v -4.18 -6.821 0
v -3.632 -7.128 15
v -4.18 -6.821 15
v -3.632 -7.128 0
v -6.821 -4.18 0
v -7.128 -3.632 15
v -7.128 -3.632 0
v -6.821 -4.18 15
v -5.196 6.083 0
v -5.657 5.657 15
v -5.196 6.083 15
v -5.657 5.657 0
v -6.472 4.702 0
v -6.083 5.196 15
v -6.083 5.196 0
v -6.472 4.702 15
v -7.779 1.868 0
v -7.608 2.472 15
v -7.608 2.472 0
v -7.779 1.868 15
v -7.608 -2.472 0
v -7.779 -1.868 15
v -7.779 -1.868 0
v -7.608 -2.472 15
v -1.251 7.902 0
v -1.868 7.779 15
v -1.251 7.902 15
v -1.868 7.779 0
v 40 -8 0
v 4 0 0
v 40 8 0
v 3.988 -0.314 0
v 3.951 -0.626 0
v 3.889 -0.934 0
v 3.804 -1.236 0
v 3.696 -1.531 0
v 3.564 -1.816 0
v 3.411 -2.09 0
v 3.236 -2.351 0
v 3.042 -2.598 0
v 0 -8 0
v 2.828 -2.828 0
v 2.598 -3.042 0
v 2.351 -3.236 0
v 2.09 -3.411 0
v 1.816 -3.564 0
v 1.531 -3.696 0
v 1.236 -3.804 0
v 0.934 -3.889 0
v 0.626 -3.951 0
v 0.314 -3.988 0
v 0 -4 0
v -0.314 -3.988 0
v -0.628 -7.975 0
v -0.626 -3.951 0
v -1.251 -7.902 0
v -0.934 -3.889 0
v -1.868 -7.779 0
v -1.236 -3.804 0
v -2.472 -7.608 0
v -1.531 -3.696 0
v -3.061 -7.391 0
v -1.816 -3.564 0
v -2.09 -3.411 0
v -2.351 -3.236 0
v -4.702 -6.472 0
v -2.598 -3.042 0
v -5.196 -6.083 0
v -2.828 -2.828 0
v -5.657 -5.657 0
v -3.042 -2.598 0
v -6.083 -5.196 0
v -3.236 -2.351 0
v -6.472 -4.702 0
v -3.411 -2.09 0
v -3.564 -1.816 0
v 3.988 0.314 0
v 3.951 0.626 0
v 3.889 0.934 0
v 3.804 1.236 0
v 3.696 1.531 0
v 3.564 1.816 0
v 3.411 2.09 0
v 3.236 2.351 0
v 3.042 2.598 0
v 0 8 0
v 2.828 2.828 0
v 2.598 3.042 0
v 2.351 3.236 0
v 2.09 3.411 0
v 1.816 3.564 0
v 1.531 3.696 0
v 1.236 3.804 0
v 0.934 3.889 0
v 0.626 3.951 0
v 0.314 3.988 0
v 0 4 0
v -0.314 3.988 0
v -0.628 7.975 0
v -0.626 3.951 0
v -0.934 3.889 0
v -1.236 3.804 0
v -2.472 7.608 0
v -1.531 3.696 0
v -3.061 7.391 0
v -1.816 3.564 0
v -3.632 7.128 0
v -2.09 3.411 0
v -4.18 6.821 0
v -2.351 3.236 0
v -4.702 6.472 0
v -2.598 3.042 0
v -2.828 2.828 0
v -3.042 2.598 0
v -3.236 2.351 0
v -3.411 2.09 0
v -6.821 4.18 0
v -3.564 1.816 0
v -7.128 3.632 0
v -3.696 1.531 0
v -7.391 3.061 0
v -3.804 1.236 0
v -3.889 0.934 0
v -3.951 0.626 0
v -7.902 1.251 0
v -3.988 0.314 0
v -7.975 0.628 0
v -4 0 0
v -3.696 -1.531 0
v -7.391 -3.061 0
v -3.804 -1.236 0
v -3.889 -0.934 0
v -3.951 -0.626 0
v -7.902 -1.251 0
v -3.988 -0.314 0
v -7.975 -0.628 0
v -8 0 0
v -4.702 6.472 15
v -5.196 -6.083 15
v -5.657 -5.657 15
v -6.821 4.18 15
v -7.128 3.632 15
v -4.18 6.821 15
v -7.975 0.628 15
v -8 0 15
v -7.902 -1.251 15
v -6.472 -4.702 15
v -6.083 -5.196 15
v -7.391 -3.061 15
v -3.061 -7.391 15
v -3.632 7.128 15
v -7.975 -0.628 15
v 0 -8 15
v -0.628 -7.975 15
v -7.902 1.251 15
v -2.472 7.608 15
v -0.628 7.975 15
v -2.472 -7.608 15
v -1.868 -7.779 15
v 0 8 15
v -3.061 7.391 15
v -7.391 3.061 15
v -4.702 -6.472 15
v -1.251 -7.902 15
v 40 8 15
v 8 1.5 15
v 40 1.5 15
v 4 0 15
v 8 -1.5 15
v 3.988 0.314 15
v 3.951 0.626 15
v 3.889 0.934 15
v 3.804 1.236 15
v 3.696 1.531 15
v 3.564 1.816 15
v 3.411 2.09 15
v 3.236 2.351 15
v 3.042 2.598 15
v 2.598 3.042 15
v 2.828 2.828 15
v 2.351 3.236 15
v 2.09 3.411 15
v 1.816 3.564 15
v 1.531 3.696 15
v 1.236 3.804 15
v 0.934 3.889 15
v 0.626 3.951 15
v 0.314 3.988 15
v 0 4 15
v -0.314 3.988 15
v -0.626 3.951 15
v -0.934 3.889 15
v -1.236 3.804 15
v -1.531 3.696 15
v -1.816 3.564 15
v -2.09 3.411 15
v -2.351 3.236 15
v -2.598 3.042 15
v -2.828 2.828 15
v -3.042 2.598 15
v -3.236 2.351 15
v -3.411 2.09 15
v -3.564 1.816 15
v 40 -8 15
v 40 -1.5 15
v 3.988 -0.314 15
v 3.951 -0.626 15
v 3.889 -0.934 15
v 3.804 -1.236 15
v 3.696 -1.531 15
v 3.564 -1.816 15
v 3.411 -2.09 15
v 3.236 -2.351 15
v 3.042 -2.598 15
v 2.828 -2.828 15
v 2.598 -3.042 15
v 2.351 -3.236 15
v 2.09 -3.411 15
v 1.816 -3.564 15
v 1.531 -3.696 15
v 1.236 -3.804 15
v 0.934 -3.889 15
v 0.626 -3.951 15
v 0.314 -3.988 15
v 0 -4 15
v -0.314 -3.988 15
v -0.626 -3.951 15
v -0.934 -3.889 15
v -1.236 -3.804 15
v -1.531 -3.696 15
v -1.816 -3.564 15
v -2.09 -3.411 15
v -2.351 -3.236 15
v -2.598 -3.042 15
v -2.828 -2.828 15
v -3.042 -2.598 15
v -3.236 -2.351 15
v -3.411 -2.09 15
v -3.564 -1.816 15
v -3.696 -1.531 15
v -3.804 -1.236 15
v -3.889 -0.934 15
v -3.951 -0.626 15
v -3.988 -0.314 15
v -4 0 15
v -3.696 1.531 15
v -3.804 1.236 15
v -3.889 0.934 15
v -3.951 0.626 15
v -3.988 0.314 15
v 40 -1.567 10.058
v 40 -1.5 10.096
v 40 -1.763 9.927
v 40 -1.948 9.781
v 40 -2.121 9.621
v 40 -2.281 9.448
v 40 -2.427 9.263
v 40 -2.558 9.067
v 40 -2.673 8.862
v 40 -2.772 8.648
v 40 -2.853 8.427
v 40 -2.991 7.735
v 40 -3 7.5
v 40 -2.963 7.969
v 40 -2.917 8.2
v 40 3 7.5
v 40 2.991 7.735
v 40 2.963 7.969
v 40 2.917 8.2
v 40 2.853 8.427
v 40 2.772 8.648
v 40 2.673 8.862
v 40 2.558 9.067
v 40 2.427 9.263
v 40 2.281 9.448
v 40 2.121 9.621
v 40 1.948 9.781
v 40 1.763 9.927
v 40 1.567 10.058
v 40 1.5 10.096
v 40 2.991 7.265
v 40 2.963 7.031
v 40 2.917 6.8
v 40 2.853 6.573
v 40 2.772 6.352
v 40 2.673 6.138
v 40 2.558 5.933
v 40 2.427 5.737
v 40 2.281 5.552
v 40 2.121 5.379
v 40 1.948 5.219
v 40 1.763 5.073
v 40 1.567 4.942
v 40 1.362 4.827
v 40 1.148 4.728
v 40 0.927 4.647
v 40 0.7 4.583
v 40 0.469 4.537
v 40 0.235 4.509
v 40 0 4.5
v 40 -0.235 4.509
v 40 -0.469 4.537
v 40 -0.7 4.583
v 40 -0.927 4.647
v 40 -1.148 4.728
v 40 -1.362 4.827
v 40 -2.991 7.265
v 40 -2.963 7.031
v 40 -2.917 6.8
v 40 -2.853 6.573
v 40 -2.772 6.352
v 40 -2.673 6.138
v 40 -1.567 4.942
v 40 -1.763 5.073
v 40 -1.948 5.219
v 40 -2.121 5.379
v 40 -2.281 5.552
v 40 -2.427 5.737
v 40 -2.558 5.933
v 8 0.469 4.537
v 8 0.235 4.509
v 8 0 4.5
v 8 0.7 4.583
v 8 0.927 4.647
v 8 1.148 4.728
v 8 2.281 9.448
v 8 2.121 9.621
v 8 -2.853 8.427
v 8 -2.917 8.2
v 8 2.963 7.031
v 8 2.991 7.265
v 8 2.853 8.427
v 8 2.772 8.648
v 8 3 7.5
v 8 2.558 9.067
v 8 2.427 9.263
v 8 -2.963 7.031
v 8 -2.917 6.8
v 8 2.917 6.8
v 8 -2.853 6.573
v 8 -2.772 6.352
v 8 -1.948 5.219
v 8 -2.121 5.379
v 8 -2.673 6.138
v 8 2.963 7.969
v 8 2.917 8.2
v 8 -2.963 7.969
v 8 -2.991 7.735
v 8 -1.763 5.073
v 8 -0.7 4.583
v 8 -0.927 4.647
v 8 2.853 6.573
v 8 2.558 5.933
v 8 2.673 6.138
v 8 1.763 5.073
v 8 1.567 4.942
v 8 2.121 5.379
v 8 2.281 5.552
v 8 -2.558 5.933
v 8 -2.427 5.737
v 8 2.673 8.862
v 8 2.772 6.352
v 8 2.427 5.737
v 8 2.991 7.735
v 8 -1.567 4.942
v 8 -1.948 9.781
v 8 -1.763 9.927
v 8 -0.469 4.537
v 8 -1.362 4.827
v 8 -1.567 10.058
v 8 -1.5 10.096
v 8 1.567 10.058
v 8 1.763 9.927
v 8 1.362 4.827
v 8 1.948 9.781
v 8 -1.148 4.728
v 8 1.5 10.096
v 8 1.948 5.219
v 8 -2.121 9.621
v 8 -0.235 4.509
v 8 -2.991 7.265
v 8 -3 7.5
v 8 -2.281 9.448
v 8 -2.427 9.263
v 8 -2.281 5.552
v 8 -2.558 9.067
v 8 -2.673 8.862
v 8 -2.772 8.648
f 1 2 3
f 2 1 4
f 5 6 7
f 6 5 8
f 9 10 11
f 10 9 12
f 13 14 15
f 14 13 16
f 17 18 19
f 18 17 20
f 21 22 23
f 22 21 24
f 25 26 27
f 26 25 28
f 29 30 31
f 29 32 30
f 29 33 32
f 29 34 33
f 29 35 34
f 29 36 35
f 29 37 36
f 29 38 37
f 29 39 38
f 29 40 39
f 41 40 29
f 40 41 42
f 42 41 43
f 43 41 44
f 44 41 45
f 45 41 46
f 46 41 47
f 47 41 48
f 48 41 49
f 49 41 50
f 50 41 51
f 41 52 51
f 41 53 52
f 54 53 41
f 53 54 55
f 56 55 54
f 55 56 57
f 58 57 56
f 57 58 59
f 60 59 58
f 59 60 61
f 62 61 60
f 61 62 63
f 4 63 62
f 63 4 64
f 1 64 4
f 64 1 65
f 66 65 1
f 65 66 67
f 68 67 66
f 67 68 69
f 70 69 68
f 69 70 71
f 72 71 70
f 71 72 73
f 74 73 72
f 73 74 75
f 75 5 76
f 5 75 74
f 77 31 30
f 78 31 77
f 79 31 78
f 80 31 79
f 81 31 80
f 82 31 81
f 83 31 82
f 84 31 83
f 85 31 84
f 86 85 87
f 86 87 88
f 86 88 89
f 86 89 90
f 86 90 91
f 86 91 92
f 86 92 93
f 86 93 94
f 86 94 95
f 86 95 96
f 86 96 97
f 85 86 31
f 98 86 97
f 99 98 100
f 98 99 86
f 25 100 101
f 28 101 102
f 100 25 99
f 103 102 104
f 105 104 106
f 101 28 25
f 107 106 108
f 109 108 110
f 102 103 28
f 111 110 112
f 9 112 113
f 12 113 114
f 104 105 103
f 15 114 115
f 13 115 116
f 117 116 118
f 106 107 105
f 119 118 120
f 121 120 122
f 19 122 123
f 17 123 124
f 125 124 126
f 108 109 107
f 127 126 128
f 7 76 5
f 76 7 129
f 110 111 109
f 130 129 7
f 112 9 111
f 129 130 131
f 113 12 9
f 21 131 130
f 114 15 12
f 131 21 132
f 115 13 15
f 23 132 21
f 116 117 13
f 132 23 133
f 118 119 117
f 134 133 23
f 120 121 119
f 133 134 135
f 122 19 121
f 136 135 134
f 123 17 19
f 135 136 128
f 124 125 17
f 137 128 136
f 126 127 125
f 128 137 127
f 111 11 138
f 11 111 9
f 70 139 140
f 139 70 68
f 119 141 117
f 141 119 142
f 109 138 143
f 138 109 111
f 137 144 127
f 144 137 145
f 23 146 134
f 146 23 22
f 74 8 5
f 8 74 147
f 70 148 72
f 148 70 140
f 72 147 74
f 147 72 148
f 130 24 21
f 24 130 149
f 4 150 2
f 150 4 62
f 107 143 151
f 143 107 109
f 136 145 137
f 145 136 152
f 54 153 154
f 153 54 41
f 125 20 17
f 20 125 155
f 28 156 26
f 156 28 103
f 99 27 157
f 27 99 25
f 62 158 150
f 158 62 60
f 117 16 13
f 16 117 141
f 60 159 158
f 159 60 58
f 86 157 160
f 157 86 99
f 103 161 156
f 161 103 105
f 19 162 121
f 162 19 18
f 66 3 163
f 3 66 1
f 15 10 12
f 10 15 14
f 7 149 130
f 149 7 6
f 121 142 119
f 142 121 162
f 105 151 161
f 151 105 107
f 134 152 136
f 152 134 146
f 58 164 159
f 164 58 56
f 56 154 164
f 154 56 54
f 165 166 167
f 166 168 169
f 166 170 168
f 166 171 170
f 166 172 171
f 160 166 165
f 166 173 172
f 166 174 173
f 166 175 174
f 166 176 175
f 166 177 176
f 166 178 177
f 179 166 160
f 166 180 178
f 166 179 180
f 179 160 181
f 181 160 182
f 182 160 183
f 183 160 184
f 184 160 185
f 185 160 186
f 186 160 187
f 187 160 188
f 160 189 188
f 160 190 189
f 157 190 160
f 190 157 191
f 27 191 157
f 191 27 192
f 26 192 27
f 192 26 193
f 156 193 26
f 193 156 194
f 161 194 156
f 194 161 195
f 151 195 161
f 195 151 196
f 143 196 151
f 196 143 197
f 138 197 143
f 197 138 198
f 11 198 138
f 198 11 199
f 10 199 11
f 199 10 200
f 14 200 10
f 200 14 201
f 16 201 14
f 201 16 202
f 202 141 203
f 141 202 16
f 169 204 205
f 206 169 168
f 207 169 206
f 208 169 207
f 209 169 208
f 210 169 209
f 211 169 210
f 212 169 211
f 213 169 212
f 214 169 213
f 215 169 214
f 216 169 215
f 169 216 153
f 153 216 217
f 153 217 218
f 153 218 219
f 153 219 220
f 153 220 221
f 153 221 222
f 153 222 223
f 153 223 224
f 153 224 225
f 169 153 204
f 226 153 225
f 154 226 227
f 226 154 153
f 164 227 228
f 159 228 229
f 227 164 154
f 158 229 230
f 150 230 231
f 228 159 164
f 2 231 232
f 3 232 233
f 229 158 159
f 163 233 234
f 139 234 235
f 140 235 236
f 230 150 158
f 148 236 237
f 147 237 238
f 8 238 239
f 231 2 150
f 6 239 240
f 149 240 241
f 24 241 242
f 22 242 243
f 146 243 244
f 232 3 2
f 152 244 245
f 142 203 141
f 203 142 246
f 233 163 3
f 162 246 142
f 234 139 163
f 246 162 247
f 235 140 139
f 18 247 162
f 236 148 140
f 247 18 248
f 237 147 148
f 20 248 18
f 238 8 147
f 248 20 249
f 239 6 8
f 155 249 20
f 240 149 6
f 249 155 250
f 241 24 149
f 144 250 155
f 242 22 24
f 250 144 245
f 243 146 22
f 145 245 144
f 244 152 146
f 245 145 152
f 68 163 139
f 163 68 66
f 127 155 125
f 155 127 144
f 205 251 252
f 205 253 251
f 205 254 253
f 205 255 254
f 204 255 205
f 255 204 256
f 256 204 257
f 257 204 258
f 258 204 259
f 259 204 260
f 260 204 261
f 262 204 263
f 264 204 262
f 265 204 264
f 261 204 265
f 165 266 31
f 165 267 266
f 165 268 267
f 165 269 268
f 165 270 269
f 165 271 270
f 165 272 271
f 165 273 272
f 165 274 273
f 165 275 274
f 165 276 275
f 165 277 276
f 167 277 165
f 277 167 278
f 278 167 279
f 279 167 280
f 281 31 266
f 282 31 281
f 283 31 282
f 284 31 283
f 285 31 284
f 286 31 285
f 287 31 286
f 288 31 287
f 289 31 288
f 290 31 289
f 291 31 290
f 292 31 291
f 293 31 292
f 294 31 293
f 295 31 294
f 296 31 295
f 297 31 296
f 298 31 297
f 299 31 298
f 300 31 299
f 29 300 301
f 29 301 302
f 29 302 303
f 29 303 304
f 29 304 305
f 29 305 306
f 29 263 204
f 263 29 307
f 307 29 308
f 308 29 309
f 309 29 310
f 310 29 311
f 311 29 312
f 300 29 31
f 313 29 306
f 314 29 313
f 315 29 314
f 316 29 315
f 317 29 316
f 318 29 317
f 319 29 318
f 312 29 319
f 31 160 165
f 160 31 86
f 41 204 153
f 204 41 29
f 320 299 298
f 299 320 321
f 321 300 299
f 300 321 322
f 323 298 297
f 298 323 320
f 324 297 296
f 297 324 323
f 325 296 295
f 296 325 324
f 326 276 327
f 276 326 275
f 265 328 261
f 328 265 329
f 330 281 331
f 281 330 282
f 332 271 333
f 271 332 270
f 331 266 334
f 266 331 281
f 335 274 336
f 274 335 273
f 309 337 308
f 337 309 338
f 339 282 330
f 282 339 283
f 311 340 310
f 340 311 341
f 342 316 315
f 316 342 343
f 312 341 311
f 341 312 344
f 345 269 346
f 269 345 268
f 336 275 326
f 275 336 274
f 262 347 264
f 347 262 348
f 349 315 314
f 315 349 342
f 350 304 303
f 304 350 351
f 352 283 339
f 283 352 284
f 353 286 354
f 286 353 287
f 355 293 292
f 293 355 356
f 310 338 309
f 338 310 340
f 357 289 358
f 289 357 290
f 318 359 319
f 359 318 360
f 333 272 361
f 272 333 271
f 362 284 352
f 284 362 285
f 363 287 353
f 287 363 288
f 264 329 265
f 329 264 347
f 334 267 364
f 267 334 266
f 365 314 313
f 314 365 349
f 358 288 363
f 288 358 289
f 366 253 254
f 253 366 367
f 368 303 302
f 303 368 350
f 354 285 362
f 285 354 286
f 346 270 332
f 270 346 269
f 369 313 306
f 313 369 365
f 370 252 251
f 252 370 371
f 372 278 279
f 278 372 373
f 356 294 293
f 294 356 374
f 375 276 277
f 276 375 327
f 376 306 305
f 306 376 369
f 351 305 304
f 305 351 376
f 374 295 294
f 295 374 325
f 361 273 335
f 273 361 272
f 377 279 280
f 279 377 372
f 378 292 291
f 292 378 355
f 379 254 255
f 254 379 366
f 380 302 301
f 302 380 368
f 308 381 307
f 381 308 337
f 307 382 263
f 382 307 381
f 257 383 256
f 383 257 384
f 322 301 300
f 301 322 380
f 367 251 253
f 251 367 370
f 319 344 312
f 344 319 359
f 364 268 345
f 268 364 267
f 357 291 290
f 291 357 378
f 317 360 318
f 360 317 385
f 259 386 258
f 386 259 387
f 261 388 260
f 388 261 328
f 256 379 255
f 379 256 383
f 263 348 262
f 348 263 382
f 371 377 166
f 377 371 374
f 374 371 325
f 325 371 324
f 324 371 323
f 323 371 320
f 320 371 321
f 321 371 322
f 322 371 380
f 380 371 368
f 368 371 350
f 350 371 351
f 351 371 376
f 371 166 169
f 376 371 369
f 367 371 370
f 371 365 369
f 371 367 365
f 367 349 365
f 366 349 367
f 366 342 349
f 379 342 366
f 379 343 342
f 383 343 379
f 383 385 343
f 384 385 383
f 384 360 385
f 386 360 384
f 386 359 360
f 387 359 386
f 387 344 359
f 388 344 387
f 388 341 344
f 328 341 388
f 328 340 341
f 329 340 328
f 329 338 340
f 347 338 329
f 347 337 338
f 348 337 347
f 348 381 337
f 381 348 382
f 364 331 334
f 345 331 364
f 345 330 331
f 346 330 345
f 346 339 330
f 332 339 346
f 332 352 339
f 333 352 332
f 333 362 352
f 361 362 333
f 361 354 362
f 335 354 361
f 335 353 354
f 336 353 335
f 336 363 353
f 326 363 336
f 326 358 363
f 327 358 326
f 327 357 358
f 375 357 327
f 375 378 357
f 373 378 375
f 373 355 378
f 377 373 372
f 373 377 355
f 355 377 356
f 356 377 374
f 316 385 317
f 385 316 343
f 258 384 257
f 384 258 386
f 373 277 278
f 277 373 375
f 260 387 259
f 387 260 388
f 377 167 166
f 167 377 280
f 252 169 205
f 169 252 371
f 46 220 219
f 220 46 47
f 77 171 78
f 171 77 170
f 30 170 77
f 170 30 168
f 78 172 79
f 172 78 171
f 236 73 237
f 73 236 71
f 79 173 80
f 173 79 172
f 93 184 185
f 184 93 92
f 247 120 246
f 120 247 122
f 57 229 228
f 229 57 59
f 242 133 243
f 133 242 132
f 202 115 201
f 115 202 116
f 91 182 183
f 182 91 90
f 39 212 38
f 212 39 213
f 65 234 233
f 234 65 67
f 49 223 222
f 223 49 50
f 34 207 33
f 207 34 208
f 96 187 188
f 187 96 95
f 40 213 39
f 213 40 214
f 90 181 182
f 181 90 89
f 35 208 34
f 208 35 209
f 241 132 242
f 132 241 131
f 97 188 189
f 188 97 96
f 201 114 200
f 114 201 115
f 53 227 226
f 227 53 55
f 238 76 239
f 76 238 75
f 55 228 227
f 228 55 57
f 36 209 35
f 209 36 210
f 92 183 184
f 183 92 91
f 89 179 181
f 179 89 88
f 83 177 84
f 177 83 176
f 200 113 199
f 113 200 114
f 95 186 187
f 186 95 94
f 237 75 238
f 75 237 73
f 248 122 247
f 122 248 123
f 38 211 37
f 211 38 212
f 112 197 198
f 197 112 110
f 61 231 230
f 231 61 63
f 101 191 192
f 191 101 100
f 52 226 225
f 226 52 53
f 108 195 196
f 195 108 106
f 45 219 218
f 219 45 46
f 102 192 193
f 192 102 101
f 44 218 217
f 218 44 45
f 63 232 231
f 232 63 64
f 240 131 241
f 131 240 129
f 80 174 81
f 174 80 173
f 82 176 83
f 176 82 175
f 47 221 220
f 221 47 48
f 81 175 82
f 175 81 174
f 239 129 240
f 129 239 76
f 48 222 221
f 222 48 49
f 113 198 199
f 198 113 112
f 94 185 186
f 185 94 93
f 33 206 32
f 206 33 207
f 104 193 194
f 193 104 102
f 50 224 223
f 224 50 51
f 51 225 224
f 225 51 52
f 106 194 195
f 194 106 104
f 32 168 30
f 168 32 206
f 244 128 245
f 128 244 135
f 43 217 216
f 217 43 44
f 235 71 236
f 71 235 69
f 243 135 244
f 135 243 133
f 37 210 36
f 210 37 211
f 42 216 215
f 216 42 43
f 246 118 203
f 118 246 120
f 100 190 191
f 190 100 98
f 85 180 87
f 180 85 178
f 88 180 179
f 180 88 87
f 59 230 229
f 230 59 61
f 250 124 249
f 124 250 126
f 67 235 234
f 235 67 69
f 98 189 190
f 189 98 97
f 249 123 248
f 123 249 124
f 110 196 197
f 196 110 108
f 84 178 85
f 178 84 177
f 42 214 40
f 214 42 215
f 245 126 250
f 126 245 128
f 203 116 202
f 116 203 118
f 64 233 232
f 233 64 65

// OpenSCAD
detail = 80;	//20=low, 80=high
height = 15;
barLength = 40;
holeDiam = 8;	//M8 bolt
ledgeThick = 2.5;
shaftDiam = 6;

shaftMount2();

module shaftMount2() {
	difference() {
		union() {
			cylinder(h=height,d=holeDiam*2,$fn=detail);
			translate([0,-holeDiam,0])cube([barLength,holeDiam*2,height]);
		}
		cylinder(h=height,d=holeDiam,$fn=detail);
		#translate([holeDiam,0,height/2])rotate([0,90,0]) {
			cylinder(h=barLength,d=shaftDiam,$fn=detail);
			translate([-height,-shaftDiam/4,0])cube([height,shaftDiam/2,barLength]);
		}
	}
	
}

module shaftMount() {
	difference() {
		union() {
			difference() {
				cylinder(h=height,d=holeDiam*2,$fn=detail);
				cylinder(h=height,d=holeDiam,$fn=detail);
			}
			translate([-barLength/2,holeDiam/2,0]) cube([barLength,3*holeDiam/4,height]);
		}
		translate([-barLength/2,7,ledgeThick]) cube([barLength,5,height-ledgeThick]);
		translate([0,holeDiam,height/2+ledgeThick/2]) rotate([90,0,0]) {
			translate([-15,0,0]) cylinder(h=10,r=1.5,center=true,$fn=detail);
			translate([15,0,0]) cylinder(h=10,r=1.5,center=true,$fn=detail);
		}
	}
}
